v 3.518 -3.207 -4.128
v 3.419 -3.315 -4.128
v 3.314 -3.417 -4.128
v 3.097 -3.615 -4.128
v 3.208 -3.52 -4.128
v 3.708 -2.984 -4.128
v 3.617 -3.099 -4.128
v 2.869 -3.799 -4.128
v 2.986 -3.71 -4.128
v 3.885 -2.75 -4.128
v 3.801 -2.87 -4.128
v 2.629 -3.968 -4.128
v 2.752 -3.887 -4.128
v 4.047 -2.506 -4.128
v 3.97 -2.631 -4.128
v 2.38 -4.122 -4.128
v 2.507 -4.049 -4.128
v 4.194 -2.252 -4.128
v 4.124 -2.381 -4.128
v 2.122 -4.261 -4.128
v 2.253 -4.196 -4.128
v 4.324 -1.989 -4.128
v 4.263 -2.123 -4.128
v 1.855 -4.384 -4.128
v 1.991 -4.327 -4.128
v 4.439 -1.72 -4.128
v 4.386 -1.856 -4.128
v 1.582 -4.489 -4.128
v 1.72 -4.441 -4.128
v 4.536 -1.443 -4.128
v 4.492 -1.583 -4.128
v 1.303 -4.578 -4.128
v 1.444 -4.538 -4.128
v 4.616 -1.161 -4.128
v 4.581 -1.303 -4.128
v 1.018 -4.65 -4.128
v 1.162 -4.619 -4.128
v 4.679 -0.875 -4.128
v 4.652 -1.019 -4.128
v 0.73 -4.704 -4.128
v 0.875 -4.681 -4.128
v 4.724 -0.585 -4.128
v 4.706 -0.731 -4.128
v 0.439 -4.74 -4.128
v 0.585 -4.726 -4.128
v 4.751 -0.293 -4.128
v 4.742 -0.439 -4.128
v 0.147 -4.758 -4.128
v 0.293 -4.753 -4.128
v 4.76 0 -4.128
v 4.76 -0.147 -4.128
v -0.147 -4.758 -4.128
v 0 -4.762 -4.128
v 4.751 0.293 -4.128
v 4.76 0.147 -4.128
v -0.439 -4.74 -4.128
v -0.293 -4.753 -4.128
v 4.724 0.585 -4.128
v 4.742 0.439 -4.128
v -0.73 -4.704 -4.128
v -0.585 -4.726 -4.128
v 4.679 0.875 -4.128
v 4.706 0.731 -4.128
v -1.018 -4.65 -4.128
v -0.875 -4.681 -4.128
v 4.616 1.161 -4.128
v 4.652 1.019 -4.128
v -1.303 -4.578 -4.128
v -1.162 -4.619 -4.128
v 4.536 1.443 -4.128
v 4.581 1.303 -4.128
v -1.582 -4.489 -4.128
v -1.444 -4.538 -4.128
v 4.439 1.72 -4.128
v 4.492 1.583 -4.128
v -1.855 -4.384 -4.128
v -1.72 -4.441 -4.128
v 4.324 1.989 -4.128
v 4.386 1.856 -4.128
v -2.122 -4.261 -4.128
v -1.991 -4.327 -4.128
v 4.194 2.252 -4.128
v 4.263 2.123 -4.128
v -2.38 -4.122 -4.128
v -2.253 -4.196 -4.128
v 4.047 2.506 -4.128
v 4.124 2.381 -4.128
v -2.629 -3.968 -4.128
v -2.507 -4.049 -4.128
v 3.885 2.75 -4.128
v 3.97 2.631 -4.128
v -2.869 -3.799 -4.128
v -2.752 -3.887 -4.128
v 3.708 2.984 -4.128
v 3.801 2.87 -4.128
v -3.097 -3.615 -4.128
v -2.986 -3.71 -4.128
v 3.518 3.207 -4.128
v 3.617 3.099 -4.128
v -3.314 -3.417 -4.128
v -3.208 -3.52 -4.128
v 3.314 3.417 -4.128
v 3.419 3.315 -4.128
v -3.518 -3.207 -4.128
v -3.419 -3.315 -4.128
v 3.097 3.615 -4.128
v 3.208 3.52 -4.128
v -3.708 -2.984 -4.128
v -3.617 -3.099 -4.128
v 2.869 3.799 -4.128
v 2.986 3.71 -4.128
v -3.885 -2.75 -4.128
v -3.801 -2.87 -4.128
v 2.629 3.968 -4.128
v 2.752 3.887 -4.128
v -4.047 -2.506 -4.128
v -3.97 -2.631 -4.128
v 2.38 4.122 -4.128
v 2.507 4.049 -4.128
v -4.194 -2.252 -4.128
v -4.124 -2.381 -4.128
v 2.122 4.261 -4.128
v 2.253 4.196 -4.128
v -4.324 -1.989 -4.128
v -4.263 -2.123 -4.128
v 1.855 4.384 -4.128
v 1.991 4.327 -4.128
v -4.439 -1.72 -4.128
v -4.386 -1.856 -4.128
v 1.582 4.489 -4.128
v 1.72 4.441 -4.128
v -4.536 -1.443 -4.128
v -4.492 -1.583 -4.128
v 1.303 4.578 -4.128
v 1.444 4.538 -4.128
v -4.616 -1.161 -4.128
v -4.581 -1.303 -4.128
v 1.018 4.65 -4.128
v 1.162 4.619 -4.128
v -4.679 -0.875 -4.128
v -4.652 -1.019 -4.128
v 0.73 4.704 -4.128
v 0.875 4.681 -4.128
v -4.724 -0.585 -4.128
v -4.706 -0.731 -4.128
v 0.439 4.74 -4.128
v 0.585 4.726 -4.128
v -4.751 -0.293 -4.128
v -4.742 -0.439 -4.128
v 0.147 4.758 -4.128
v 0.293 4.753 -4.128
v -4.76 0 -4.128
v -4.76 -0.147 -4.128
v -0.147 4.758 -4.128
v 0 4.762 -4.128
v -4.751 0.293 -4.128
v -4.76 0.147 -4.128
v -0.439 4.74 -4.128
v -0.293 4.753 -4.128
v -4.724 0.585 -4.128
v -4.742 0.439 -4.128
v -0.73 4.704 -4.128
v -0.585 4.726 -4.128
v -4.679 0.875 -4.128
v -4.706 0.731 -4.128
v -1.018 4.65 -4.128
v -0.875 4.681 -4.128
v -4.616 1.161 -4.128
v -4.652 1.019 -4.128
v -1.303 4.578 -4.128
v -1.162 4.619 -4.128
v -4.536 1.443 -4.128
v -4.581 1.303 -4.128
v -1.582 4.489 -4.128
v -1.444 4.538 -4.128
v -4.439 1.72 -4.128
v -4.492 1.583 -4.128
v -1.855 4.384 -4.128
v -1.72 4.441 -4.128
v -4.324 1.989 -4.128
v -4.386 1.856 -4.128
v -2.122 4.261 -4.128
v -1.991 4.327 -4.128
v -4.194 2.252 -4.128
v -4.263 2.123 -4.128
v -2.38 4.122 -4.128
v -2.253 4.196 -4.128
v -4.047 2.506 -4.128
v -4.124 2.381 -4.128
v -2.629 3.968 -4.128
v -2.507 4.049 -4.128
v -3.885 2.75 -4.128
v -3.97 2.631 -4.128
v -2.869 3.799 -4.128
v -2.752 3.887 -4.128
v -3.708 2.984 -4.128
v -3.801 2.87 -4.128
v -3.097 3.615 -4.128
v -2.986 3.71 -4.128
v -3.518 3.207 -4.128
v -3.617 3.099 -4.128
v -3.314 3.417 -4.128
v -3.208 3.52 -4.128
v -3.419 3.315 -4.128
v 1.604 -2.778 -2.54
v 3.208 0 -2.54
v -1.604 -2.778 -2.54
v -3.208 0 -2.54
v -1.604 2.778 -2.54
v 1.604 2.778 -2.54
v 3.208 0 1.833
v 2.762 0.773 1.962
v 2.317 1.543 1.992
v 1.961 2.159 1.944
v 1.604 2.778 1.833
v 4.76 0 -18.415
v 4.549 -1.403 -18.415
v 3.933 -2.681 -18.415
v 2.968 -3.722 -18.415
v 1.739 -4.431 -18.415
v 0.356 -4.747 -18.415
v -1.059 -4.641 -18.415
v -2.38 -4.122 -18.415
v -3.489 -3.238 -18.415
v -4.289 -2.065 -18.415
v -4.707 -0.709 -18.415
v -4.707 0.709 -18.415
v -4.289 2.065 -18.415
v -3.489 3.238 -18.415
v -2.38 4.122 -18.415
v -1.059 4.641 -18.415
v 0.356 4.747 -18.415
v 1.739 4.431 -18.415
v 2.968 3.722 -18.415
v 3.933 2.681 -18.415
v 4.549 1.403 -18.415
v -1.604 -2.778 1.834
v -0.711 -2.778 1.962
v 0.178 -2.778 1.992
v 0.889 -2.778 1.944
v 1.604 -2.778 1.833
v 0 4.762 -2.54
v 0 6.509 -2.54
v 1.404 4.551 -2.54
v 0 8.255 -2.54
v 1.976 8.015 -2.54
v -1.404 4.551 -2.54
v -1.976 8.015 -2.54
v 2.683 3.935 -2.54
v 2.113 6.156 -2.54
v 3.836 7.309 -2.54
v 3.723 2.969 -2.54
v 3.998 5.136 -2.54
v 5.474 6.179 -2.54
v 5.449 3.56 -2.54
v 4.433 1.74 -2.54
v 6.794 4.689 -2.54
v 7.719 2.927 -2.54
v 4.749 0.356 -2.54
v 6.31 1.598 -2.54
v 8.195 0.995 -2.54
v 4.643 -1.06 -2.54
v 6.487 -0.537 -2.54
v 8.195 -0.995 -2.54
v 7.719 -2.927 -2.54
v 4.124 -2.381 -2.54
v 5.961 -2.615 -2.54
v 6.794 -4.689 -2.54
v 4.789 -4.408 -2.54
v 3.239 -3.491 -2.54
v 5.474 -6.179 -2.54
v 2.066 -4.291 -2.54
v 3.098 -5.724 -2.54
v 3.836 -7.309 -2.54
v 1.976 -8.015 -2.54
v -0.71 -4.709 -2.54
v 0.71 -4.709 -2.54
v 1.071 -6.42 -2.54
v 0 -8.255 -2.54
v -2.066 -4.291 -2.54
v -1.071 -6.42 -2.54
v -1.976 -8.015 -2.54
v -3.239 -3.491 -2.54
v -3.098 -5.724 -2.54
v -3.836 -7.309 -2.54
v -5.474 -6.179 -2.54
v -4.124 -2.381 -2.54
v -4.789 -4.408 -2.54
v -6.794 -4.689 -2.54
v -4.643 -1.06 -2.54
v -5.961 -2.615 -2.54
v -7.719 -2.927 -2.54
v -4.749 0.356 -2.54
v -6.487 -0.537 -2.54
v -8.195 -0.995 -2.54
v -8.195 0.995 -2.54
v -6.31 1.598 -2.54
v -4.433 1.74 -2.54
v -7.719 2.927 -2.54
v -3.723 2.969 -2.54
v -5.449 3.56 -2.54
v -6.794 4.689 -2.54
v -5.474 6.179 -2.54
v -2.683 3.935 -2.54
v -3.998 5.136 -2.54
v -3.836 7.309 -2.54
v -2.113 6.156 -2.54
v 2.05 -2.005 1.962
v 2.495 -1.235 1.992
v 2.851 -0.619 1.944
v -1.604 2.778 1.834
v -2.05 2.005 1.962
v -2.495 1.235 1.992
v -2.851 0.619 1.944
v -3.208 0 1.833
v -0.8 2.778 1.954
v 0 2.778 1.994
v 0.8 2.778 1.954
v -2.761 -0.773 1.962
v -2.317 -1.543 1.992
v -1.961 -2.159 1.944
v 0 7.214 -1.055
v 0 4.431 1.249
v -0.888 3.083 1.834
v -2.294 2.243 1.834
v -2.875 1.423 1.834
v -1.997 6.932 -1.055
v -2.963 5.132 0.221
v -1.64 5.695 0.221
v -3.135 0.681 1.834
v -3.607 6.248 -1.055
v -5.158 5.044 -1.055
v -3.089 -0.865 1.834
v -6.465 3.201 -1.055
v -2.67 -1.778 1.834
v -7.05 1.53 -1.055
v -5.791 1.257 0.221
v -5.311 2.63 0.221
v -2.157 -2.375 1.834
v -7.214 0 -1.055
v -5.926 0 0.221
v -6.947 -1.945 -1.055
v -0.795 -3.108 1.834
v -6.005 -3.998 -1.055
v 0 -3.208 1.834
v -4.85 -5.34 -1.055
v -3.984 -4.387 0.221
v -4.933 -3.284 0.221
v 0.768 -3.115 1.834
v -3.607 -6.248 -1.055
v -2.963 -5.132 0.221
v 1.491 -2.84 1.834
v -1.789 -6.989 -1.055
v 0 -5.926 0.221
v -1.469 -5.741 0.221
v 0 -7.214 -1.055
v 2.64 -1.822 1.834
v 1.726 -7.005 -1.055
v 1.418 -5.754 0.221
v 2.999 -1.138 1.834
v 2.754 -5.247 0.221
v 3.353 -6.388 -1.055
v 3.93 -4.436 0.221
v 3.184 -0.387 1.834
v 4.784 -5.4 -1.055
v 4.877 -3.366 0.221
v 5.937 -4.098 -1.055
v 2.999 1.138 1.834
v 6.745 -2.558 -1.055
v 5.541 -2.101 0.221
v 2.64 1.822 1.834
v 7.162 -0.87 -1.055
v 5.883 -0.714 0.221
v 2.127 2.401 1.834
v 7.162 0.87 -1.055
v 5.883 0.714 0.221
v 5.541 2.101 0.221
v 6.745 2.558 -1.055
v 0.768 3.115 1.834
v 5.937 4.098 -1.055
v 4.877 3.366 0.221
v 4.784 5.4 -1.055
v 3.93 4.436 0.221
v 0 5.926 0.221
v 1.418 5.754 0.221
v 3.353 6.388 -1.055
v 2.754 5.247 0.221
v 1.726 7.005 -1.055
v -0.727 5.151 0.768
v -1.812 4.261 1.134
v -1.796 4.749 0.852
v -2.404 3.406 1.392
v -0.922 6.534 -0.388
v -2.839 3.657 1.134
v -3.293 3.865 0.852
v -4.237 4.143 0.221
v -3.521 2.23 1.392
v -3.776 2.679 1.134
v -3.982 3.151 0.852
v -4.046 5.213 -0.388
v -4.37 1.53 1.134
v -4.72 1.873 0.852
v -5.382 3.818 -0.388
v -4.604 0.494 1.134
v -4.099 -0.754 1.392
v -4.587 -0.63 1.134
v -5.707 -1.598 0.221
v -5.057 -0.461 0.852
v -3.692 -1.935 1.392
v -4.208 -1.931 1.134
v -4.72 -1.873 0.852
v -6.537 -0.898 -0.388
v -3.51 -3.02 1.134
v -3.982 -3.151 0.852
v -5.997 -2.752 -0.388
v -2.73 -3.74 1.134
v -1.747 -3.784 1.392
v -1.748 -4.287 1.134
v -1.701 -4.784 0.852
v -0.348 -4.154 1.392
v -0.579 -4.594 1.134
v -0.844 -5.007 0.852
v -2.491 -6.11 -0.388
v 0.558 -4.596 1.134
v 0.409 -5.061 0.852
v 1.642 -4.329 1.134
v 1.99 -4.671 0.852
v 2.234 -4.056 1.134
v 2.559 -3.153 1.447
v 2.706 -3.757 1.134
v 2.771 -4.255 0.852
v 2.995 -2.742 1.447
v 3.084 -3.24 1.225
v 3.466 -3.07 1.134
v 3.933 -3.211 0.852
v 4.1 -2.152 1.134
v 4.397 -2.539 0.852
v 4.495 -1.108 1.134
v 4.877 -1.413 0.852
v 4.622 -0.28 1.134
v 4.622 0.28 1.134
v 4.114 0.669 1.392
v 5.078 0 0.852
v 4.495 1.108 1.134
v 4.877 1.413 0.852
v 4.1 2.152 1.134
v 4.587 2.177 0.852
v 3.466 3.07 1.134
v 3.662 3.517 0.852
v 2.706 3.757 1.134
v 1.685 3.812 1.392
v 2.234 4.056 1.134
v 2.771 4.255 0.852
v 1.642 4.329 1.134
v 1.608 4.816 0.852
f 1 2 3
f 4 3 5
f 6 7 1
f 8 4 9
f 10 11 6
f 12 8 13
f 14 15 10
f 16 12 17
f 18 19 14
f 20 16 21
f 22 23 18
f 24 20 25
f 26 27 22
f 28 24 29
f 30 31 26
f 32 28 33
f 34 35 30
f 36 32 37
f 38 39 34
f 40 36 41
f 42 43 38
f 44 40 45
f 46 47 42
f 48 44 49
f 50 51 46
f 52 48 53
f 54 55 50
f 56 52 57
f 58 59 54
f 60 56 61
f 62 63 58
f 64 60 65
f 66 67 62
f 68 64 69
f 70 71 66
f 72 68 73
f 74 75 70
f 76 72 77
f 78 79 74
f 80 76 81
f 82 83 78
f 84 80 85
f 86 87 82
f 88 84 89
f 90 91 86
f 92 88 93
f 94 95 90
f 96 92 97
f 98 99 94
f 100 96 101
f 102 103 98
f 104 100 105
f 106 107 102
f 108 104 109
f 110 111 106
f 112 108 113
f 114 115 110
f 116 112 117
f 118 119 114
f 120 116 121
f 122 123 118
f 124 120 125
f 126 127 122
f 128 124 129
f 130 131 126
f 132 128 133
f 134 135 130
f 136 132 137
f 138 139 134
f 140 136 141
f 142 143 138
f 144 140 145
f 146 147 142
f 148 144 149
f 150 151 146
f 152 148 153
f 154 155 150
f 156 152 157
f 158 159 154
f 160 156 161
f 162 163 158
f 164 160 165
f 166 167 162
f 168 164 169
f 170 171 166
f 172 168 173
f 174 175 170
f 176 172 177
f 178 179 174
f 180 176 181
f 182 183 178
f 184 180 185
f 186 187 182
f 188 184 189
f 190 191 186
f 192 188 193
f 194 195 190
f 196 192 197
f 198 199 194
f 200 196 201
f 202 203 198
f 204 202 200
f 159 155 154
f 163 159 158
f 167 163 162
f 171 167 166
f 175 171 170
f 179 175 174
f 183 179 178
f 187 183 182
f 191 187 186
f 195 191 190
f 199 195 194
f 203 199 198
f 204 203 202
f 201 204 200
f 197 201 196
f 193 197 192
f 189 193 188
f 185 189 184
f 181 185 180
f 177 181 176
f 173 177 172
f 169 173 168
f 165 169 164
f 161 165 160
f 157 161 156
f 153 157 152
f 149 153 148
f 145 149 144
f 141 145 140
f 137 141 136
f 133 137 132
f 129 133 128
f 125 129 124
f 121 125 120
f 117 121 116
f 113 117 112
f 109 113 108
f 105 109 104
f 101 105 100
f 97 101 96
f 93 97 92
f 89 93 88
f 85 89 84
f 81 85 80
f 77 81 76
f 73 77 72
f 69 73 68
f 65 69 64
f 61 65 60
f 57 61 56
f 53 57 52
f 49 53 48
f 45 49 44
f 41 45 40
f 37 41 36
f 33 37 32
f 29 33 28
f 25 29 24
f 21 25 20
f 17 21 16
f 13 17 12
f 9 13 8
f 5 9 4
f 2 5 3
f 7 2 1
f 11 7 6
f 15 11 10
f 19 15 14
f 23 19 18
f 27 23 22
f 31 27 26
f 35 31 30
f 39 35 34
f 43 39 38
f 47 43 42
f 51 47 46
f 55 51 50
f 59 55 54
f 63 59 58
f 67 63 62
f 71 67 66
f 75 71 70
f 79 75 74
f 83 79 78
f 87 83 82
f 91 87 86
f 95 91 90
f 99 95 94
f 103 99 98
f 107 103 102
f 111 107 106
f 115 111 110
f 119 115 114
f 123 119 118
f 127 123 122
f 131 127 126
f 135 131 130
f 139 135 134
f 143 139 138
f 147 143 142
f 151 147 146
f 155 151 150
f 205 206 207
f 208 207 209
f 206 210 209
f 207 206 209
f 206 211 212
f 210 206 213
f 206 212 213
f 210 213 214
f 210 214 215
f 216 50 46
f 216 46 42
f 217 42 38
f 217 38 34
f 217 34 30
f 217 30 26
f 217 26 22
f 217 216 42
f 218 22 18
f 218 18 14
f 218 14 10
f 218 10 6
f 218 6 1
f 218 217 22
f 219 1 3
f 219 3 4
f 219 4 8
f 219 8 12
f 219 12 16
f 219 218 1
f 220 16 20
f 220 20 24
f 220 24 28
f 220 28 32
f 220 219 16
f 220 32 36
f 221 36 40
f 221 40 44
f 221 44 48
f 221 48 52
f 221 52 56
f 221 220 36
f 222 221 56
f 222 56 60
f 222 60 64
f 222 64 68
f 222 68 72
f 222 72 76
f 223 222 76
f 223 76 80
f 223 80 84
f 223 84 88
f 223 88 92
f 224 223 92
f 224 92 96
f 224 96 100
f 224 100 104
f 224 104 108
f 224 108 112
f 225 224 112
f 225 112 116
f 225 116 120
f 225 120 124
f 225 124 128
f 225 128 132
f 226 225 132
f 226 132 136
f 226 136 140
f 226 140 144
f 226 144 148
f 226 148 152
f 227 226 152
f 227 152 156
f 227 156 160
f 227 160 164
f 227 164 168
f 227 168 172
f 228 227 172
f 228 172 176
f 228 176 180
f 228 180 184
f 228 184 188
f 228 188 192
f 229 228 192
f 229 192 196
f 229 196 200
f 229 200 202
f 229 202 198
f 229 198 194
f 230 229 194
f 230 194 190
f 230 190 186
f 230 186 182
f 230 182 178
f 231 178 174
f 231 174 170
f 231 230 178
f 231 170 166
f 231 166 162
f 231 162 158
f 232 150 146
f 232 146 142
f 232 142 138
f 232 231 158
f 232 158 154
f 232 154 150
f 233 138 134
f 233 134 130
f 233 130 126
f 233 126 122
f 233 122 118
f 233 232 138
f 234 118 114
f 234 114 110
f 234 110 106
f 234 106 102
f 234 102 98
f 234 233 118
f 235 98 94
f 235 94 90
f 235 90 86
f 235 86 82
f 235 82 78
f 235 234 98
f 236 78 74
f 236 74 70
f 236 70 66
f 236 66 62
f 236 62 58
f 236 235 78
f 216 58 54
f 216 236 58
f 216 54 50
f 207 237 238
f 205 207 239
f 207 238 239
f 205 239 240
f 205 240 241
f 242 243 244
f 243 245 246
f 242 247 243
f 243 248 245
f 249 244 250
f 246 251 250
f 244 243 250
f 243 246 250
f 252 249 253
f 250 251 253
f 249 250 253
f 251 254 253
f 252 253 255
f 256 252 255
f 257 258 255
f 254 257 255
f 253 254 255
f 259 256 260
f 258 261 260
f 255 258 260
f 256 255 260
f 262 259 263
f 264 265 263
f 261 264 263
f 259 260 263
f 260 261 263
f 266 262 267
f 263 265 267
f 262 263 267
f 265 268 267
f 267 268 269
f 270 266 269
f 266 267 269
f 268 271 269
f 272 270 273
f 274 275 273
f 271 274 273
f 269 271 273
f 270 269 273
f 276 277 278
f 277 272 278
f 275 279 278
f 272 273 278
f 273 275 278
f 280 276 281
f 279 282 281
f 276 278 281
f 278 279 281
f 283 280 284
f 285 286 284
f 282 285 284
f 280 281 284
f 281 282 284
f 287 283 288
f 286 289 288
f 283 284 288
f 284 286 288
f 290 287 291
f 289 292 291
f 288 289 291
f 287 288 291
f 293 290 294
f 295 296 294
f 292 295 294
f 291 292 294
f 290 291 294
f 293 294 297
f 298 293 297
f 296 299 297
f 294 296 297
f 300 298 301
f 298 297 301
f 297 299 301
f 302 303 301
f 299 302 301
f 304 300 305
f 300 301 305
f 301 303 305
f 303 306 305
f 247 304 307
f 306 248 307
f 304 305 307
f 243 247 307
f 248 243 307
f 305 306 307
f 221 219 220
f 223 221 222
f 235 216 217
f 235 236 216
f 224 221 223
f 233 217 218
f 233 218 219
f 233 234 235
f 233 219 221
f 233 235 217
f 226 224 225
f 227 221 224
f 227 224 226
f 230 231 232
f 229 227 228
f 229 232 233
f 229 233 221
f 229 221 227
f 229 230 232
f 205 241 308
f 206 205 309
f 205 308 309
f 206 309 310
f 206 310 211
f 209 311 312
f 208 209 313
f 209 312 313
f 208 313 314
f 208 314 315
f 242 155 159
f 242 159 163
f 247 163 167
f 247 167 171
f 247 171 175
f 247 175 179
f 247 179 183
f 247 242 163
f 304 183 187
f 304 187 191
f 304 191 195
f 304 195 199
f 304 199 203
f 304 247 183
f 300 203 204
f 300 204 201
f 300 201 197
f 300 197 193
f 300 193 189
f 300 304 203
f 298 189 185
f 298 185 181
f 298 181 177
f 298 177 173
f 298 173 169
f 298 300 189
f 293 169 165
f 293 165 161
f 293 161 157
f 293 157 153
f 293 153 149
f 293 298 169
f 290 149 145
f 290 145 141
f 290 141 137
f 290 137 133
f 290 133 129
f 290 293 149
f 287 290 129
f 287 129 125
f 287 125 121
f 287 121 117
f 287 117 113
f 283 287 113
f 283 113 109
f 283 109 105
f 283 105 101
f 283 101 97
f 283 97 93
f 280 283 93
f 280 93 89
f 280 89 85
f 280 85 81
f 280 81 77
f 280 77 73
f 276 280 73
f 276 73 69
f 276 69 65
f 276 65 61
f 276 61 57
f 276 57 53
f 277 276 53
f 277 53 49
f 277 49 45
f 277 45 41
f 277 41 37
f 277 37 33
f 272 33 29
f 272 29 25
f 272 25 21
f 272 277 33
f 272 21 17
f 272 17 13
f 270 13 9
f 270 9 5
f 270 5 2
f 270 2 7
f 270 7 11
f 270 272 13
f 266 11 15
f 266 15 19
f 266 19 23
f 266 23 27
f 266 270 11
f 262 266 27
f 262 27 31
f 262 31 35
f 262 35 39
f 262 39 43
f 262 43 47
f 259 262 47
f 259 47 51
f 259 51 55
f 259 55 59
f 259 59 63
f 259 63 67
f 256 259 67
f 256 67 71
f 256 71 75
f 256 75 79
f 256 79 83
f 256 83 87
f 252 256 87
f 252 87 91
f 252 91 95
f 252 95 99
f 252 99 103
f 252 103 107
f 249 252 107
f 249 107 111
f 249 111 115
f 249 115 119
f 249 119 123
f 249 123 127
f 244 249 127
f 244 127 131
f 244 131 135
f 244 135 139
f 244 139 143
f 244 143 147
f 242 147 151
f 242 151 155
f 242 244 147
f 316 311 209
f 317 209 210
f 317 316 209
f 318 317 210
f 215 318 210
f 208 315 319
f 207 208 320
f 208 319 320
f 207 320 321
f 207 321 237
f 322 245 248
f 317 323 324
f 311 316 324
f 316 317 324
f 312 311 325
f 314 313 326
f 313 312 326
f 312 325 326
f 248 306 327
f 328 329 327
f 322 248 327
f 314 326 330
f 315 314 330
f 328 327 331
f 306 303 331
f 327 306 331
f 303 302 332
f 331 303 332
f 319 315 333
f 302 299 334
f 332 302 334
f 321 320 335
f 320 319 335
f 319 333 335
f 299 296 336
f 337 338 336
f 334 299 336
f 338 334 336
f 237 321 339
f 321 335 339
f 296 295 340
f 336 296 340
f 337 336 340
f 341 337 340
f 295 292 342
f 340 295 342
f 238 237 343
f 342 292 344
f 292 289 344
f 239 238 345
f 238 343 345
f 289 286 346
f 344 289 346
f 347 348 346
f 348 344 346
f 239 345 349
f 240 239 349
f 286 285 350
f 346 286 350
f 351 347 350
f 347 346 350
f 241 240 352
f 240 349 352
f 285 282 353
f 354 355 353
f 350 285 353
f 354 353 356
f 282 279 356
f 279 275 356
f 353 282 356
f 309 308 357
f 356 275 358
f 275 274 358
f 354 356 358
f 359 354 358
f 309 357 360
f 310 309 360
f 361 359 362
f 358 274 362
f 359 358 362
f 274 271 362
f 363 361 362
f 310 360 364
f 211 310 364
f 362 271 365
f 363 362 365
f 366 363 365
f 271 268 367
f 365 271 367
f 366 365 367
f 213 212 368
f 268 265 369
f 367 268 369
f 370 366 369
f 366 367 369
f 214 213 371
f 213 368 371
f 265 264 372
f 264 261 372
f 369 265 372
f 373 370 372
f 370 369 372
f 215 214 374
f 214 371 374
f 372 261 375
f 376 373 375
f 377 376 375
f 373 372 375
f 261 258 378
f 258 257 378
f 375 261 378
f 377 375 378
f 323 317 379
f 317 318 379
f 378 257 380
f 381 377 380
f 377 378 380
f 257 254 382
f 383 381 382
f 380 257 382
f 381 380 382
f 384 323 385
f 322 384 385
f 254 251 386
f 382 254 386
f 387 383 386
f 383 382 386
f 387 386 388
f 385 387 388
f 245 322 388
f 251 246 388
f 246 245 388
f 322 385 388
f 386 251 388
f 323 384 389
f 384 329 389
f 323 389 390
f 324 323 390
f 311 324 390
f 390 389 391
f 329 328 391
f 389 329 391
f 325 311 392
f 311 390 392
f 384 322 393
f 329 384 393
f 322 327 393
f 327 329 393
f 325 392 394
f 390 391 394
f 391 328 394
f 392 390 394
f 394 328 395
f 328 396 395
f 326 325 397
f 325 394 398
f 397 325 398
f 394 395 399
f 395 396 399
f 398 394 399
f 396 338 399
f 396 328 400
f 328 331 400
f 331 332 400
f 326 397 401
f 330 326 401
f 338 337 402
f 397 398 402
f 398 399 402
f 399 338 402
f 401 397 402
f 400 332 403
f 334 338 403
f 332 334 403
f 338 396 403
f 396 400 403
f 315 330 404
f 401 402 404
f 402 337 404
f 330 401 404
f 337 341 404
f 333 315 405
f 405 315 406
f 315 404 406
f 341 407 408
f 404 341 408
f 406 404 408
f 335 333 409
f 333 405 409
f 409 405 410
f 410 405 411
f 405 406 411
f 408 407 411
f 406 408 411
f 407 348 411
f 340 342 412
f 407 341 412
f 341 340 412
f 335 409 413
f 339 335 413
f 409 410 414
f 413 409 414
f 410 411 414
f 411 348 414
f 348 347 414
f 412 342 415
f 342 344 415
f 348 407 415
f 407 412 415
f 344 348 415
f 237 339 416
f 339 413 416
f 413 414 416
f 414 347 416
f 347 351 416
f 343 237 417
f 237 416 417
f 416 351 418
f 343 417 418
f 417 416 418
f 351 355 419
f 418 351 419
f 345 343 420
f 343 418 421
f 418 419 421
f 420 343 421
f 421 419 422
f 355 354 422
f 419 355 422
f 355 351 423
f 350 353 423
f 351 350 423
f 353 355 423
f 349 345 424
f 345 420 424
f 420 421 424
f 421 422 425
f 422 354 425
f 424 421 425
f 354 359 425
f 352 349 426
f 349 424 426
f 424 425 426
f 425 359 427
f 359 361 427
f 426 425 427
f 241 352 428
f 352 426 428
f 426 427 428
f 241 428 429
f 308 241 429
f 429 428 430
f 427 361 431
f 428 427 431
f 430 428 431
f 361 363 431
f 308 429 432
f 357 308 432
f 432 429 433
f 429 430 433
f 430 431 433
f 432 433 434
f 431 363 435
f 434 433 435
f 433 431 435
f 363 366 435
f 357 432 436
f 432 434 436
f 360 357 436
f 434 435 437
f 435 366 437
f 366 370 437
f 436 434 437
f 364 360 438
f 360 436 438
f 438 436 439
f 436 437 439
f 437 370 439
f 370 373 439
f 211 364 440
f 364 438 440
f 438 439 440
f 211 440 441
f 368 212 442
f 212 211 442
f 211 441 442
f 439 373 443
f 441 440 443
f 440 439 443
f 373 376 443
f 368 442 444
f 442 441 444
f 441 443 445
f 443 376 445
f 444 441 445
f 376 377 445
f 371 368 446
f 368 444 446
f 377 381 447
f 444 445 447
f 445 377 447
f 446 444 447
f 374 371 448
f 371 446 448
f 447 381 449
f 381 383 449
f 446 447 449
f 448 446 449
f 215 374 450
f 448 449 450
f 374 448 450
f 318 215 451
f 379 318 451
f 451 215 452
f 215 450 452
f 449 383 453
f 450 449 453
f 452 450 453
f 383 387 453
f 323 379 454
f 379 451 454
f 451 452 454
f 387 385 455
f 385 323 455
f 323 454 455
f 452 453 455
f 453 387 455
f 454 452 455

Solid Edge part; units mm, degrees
sketch "Sketch1" plane through (0, 0, 0) normal (1, 0, 0) x (0, 1, 0)
  line L0 (0, -2.54) -> (0, 2.54)
  arc A0 (0, 2.54) -> (8.255, -2.54) centre (-0.5525, -7.605) cw
  line L1 (0, -2.54) -> (8.255, -2.54)
  dimension "D1" = 5.08
  dimension "D2" = 10.16
revolve "RevolvedProtrusion1" add sketch "Sketch1" angle 360 about axis through (0, 0, -14.7796) along (0, 0, 1)
sketch "Sketch2" plane through (0, 0, -2.54) normal (0, 0, -1) x (0, 1, 0)
  circle A0 centre (0, 0) radius 4.7625
  dimension "D1" = 9.525
extrude "Protrusion1" add sketch "Sketch2" along normal blind 15.875
sketch "Sketch3" plane through (0, 0, -18.415) normal (0, 0, -1) x (1, 0, 0)
  circle A0 centre (0, 0) radius 4.76
  dimension "D1" = 0.0025
extrude "Cutout1" cut sketch "Sketch3" against normal blind 14.2875 flip side to cut
sketch "Sketch4" plane through (-0.6032, 0.3606, 5.08) normal (0, 0, 1) x (1, 0, 0)
  line L0 (-1.0007, 2.4175) -> (2.2072, 2.4175)
  line L1 (3.8111, -0.3606) -> (2.2072, 2.4175)
  line L2 (2.2072, -3.1387) -> (3.8111, -0.3606)
  line L3 (-1.0007, -3.1387) -> (2.2072, -3.1387)
  line L4 (-2.6047, -0.3606) -> (-1.0007, -3.1387)
  line L5 (-1.0007, 2.4175) -> (-2.6047, -0.3606)
extrude "ExtrudedCutout_11" cut sketch "Sketch4" against normal blind 7.62
properties part number "163739"
